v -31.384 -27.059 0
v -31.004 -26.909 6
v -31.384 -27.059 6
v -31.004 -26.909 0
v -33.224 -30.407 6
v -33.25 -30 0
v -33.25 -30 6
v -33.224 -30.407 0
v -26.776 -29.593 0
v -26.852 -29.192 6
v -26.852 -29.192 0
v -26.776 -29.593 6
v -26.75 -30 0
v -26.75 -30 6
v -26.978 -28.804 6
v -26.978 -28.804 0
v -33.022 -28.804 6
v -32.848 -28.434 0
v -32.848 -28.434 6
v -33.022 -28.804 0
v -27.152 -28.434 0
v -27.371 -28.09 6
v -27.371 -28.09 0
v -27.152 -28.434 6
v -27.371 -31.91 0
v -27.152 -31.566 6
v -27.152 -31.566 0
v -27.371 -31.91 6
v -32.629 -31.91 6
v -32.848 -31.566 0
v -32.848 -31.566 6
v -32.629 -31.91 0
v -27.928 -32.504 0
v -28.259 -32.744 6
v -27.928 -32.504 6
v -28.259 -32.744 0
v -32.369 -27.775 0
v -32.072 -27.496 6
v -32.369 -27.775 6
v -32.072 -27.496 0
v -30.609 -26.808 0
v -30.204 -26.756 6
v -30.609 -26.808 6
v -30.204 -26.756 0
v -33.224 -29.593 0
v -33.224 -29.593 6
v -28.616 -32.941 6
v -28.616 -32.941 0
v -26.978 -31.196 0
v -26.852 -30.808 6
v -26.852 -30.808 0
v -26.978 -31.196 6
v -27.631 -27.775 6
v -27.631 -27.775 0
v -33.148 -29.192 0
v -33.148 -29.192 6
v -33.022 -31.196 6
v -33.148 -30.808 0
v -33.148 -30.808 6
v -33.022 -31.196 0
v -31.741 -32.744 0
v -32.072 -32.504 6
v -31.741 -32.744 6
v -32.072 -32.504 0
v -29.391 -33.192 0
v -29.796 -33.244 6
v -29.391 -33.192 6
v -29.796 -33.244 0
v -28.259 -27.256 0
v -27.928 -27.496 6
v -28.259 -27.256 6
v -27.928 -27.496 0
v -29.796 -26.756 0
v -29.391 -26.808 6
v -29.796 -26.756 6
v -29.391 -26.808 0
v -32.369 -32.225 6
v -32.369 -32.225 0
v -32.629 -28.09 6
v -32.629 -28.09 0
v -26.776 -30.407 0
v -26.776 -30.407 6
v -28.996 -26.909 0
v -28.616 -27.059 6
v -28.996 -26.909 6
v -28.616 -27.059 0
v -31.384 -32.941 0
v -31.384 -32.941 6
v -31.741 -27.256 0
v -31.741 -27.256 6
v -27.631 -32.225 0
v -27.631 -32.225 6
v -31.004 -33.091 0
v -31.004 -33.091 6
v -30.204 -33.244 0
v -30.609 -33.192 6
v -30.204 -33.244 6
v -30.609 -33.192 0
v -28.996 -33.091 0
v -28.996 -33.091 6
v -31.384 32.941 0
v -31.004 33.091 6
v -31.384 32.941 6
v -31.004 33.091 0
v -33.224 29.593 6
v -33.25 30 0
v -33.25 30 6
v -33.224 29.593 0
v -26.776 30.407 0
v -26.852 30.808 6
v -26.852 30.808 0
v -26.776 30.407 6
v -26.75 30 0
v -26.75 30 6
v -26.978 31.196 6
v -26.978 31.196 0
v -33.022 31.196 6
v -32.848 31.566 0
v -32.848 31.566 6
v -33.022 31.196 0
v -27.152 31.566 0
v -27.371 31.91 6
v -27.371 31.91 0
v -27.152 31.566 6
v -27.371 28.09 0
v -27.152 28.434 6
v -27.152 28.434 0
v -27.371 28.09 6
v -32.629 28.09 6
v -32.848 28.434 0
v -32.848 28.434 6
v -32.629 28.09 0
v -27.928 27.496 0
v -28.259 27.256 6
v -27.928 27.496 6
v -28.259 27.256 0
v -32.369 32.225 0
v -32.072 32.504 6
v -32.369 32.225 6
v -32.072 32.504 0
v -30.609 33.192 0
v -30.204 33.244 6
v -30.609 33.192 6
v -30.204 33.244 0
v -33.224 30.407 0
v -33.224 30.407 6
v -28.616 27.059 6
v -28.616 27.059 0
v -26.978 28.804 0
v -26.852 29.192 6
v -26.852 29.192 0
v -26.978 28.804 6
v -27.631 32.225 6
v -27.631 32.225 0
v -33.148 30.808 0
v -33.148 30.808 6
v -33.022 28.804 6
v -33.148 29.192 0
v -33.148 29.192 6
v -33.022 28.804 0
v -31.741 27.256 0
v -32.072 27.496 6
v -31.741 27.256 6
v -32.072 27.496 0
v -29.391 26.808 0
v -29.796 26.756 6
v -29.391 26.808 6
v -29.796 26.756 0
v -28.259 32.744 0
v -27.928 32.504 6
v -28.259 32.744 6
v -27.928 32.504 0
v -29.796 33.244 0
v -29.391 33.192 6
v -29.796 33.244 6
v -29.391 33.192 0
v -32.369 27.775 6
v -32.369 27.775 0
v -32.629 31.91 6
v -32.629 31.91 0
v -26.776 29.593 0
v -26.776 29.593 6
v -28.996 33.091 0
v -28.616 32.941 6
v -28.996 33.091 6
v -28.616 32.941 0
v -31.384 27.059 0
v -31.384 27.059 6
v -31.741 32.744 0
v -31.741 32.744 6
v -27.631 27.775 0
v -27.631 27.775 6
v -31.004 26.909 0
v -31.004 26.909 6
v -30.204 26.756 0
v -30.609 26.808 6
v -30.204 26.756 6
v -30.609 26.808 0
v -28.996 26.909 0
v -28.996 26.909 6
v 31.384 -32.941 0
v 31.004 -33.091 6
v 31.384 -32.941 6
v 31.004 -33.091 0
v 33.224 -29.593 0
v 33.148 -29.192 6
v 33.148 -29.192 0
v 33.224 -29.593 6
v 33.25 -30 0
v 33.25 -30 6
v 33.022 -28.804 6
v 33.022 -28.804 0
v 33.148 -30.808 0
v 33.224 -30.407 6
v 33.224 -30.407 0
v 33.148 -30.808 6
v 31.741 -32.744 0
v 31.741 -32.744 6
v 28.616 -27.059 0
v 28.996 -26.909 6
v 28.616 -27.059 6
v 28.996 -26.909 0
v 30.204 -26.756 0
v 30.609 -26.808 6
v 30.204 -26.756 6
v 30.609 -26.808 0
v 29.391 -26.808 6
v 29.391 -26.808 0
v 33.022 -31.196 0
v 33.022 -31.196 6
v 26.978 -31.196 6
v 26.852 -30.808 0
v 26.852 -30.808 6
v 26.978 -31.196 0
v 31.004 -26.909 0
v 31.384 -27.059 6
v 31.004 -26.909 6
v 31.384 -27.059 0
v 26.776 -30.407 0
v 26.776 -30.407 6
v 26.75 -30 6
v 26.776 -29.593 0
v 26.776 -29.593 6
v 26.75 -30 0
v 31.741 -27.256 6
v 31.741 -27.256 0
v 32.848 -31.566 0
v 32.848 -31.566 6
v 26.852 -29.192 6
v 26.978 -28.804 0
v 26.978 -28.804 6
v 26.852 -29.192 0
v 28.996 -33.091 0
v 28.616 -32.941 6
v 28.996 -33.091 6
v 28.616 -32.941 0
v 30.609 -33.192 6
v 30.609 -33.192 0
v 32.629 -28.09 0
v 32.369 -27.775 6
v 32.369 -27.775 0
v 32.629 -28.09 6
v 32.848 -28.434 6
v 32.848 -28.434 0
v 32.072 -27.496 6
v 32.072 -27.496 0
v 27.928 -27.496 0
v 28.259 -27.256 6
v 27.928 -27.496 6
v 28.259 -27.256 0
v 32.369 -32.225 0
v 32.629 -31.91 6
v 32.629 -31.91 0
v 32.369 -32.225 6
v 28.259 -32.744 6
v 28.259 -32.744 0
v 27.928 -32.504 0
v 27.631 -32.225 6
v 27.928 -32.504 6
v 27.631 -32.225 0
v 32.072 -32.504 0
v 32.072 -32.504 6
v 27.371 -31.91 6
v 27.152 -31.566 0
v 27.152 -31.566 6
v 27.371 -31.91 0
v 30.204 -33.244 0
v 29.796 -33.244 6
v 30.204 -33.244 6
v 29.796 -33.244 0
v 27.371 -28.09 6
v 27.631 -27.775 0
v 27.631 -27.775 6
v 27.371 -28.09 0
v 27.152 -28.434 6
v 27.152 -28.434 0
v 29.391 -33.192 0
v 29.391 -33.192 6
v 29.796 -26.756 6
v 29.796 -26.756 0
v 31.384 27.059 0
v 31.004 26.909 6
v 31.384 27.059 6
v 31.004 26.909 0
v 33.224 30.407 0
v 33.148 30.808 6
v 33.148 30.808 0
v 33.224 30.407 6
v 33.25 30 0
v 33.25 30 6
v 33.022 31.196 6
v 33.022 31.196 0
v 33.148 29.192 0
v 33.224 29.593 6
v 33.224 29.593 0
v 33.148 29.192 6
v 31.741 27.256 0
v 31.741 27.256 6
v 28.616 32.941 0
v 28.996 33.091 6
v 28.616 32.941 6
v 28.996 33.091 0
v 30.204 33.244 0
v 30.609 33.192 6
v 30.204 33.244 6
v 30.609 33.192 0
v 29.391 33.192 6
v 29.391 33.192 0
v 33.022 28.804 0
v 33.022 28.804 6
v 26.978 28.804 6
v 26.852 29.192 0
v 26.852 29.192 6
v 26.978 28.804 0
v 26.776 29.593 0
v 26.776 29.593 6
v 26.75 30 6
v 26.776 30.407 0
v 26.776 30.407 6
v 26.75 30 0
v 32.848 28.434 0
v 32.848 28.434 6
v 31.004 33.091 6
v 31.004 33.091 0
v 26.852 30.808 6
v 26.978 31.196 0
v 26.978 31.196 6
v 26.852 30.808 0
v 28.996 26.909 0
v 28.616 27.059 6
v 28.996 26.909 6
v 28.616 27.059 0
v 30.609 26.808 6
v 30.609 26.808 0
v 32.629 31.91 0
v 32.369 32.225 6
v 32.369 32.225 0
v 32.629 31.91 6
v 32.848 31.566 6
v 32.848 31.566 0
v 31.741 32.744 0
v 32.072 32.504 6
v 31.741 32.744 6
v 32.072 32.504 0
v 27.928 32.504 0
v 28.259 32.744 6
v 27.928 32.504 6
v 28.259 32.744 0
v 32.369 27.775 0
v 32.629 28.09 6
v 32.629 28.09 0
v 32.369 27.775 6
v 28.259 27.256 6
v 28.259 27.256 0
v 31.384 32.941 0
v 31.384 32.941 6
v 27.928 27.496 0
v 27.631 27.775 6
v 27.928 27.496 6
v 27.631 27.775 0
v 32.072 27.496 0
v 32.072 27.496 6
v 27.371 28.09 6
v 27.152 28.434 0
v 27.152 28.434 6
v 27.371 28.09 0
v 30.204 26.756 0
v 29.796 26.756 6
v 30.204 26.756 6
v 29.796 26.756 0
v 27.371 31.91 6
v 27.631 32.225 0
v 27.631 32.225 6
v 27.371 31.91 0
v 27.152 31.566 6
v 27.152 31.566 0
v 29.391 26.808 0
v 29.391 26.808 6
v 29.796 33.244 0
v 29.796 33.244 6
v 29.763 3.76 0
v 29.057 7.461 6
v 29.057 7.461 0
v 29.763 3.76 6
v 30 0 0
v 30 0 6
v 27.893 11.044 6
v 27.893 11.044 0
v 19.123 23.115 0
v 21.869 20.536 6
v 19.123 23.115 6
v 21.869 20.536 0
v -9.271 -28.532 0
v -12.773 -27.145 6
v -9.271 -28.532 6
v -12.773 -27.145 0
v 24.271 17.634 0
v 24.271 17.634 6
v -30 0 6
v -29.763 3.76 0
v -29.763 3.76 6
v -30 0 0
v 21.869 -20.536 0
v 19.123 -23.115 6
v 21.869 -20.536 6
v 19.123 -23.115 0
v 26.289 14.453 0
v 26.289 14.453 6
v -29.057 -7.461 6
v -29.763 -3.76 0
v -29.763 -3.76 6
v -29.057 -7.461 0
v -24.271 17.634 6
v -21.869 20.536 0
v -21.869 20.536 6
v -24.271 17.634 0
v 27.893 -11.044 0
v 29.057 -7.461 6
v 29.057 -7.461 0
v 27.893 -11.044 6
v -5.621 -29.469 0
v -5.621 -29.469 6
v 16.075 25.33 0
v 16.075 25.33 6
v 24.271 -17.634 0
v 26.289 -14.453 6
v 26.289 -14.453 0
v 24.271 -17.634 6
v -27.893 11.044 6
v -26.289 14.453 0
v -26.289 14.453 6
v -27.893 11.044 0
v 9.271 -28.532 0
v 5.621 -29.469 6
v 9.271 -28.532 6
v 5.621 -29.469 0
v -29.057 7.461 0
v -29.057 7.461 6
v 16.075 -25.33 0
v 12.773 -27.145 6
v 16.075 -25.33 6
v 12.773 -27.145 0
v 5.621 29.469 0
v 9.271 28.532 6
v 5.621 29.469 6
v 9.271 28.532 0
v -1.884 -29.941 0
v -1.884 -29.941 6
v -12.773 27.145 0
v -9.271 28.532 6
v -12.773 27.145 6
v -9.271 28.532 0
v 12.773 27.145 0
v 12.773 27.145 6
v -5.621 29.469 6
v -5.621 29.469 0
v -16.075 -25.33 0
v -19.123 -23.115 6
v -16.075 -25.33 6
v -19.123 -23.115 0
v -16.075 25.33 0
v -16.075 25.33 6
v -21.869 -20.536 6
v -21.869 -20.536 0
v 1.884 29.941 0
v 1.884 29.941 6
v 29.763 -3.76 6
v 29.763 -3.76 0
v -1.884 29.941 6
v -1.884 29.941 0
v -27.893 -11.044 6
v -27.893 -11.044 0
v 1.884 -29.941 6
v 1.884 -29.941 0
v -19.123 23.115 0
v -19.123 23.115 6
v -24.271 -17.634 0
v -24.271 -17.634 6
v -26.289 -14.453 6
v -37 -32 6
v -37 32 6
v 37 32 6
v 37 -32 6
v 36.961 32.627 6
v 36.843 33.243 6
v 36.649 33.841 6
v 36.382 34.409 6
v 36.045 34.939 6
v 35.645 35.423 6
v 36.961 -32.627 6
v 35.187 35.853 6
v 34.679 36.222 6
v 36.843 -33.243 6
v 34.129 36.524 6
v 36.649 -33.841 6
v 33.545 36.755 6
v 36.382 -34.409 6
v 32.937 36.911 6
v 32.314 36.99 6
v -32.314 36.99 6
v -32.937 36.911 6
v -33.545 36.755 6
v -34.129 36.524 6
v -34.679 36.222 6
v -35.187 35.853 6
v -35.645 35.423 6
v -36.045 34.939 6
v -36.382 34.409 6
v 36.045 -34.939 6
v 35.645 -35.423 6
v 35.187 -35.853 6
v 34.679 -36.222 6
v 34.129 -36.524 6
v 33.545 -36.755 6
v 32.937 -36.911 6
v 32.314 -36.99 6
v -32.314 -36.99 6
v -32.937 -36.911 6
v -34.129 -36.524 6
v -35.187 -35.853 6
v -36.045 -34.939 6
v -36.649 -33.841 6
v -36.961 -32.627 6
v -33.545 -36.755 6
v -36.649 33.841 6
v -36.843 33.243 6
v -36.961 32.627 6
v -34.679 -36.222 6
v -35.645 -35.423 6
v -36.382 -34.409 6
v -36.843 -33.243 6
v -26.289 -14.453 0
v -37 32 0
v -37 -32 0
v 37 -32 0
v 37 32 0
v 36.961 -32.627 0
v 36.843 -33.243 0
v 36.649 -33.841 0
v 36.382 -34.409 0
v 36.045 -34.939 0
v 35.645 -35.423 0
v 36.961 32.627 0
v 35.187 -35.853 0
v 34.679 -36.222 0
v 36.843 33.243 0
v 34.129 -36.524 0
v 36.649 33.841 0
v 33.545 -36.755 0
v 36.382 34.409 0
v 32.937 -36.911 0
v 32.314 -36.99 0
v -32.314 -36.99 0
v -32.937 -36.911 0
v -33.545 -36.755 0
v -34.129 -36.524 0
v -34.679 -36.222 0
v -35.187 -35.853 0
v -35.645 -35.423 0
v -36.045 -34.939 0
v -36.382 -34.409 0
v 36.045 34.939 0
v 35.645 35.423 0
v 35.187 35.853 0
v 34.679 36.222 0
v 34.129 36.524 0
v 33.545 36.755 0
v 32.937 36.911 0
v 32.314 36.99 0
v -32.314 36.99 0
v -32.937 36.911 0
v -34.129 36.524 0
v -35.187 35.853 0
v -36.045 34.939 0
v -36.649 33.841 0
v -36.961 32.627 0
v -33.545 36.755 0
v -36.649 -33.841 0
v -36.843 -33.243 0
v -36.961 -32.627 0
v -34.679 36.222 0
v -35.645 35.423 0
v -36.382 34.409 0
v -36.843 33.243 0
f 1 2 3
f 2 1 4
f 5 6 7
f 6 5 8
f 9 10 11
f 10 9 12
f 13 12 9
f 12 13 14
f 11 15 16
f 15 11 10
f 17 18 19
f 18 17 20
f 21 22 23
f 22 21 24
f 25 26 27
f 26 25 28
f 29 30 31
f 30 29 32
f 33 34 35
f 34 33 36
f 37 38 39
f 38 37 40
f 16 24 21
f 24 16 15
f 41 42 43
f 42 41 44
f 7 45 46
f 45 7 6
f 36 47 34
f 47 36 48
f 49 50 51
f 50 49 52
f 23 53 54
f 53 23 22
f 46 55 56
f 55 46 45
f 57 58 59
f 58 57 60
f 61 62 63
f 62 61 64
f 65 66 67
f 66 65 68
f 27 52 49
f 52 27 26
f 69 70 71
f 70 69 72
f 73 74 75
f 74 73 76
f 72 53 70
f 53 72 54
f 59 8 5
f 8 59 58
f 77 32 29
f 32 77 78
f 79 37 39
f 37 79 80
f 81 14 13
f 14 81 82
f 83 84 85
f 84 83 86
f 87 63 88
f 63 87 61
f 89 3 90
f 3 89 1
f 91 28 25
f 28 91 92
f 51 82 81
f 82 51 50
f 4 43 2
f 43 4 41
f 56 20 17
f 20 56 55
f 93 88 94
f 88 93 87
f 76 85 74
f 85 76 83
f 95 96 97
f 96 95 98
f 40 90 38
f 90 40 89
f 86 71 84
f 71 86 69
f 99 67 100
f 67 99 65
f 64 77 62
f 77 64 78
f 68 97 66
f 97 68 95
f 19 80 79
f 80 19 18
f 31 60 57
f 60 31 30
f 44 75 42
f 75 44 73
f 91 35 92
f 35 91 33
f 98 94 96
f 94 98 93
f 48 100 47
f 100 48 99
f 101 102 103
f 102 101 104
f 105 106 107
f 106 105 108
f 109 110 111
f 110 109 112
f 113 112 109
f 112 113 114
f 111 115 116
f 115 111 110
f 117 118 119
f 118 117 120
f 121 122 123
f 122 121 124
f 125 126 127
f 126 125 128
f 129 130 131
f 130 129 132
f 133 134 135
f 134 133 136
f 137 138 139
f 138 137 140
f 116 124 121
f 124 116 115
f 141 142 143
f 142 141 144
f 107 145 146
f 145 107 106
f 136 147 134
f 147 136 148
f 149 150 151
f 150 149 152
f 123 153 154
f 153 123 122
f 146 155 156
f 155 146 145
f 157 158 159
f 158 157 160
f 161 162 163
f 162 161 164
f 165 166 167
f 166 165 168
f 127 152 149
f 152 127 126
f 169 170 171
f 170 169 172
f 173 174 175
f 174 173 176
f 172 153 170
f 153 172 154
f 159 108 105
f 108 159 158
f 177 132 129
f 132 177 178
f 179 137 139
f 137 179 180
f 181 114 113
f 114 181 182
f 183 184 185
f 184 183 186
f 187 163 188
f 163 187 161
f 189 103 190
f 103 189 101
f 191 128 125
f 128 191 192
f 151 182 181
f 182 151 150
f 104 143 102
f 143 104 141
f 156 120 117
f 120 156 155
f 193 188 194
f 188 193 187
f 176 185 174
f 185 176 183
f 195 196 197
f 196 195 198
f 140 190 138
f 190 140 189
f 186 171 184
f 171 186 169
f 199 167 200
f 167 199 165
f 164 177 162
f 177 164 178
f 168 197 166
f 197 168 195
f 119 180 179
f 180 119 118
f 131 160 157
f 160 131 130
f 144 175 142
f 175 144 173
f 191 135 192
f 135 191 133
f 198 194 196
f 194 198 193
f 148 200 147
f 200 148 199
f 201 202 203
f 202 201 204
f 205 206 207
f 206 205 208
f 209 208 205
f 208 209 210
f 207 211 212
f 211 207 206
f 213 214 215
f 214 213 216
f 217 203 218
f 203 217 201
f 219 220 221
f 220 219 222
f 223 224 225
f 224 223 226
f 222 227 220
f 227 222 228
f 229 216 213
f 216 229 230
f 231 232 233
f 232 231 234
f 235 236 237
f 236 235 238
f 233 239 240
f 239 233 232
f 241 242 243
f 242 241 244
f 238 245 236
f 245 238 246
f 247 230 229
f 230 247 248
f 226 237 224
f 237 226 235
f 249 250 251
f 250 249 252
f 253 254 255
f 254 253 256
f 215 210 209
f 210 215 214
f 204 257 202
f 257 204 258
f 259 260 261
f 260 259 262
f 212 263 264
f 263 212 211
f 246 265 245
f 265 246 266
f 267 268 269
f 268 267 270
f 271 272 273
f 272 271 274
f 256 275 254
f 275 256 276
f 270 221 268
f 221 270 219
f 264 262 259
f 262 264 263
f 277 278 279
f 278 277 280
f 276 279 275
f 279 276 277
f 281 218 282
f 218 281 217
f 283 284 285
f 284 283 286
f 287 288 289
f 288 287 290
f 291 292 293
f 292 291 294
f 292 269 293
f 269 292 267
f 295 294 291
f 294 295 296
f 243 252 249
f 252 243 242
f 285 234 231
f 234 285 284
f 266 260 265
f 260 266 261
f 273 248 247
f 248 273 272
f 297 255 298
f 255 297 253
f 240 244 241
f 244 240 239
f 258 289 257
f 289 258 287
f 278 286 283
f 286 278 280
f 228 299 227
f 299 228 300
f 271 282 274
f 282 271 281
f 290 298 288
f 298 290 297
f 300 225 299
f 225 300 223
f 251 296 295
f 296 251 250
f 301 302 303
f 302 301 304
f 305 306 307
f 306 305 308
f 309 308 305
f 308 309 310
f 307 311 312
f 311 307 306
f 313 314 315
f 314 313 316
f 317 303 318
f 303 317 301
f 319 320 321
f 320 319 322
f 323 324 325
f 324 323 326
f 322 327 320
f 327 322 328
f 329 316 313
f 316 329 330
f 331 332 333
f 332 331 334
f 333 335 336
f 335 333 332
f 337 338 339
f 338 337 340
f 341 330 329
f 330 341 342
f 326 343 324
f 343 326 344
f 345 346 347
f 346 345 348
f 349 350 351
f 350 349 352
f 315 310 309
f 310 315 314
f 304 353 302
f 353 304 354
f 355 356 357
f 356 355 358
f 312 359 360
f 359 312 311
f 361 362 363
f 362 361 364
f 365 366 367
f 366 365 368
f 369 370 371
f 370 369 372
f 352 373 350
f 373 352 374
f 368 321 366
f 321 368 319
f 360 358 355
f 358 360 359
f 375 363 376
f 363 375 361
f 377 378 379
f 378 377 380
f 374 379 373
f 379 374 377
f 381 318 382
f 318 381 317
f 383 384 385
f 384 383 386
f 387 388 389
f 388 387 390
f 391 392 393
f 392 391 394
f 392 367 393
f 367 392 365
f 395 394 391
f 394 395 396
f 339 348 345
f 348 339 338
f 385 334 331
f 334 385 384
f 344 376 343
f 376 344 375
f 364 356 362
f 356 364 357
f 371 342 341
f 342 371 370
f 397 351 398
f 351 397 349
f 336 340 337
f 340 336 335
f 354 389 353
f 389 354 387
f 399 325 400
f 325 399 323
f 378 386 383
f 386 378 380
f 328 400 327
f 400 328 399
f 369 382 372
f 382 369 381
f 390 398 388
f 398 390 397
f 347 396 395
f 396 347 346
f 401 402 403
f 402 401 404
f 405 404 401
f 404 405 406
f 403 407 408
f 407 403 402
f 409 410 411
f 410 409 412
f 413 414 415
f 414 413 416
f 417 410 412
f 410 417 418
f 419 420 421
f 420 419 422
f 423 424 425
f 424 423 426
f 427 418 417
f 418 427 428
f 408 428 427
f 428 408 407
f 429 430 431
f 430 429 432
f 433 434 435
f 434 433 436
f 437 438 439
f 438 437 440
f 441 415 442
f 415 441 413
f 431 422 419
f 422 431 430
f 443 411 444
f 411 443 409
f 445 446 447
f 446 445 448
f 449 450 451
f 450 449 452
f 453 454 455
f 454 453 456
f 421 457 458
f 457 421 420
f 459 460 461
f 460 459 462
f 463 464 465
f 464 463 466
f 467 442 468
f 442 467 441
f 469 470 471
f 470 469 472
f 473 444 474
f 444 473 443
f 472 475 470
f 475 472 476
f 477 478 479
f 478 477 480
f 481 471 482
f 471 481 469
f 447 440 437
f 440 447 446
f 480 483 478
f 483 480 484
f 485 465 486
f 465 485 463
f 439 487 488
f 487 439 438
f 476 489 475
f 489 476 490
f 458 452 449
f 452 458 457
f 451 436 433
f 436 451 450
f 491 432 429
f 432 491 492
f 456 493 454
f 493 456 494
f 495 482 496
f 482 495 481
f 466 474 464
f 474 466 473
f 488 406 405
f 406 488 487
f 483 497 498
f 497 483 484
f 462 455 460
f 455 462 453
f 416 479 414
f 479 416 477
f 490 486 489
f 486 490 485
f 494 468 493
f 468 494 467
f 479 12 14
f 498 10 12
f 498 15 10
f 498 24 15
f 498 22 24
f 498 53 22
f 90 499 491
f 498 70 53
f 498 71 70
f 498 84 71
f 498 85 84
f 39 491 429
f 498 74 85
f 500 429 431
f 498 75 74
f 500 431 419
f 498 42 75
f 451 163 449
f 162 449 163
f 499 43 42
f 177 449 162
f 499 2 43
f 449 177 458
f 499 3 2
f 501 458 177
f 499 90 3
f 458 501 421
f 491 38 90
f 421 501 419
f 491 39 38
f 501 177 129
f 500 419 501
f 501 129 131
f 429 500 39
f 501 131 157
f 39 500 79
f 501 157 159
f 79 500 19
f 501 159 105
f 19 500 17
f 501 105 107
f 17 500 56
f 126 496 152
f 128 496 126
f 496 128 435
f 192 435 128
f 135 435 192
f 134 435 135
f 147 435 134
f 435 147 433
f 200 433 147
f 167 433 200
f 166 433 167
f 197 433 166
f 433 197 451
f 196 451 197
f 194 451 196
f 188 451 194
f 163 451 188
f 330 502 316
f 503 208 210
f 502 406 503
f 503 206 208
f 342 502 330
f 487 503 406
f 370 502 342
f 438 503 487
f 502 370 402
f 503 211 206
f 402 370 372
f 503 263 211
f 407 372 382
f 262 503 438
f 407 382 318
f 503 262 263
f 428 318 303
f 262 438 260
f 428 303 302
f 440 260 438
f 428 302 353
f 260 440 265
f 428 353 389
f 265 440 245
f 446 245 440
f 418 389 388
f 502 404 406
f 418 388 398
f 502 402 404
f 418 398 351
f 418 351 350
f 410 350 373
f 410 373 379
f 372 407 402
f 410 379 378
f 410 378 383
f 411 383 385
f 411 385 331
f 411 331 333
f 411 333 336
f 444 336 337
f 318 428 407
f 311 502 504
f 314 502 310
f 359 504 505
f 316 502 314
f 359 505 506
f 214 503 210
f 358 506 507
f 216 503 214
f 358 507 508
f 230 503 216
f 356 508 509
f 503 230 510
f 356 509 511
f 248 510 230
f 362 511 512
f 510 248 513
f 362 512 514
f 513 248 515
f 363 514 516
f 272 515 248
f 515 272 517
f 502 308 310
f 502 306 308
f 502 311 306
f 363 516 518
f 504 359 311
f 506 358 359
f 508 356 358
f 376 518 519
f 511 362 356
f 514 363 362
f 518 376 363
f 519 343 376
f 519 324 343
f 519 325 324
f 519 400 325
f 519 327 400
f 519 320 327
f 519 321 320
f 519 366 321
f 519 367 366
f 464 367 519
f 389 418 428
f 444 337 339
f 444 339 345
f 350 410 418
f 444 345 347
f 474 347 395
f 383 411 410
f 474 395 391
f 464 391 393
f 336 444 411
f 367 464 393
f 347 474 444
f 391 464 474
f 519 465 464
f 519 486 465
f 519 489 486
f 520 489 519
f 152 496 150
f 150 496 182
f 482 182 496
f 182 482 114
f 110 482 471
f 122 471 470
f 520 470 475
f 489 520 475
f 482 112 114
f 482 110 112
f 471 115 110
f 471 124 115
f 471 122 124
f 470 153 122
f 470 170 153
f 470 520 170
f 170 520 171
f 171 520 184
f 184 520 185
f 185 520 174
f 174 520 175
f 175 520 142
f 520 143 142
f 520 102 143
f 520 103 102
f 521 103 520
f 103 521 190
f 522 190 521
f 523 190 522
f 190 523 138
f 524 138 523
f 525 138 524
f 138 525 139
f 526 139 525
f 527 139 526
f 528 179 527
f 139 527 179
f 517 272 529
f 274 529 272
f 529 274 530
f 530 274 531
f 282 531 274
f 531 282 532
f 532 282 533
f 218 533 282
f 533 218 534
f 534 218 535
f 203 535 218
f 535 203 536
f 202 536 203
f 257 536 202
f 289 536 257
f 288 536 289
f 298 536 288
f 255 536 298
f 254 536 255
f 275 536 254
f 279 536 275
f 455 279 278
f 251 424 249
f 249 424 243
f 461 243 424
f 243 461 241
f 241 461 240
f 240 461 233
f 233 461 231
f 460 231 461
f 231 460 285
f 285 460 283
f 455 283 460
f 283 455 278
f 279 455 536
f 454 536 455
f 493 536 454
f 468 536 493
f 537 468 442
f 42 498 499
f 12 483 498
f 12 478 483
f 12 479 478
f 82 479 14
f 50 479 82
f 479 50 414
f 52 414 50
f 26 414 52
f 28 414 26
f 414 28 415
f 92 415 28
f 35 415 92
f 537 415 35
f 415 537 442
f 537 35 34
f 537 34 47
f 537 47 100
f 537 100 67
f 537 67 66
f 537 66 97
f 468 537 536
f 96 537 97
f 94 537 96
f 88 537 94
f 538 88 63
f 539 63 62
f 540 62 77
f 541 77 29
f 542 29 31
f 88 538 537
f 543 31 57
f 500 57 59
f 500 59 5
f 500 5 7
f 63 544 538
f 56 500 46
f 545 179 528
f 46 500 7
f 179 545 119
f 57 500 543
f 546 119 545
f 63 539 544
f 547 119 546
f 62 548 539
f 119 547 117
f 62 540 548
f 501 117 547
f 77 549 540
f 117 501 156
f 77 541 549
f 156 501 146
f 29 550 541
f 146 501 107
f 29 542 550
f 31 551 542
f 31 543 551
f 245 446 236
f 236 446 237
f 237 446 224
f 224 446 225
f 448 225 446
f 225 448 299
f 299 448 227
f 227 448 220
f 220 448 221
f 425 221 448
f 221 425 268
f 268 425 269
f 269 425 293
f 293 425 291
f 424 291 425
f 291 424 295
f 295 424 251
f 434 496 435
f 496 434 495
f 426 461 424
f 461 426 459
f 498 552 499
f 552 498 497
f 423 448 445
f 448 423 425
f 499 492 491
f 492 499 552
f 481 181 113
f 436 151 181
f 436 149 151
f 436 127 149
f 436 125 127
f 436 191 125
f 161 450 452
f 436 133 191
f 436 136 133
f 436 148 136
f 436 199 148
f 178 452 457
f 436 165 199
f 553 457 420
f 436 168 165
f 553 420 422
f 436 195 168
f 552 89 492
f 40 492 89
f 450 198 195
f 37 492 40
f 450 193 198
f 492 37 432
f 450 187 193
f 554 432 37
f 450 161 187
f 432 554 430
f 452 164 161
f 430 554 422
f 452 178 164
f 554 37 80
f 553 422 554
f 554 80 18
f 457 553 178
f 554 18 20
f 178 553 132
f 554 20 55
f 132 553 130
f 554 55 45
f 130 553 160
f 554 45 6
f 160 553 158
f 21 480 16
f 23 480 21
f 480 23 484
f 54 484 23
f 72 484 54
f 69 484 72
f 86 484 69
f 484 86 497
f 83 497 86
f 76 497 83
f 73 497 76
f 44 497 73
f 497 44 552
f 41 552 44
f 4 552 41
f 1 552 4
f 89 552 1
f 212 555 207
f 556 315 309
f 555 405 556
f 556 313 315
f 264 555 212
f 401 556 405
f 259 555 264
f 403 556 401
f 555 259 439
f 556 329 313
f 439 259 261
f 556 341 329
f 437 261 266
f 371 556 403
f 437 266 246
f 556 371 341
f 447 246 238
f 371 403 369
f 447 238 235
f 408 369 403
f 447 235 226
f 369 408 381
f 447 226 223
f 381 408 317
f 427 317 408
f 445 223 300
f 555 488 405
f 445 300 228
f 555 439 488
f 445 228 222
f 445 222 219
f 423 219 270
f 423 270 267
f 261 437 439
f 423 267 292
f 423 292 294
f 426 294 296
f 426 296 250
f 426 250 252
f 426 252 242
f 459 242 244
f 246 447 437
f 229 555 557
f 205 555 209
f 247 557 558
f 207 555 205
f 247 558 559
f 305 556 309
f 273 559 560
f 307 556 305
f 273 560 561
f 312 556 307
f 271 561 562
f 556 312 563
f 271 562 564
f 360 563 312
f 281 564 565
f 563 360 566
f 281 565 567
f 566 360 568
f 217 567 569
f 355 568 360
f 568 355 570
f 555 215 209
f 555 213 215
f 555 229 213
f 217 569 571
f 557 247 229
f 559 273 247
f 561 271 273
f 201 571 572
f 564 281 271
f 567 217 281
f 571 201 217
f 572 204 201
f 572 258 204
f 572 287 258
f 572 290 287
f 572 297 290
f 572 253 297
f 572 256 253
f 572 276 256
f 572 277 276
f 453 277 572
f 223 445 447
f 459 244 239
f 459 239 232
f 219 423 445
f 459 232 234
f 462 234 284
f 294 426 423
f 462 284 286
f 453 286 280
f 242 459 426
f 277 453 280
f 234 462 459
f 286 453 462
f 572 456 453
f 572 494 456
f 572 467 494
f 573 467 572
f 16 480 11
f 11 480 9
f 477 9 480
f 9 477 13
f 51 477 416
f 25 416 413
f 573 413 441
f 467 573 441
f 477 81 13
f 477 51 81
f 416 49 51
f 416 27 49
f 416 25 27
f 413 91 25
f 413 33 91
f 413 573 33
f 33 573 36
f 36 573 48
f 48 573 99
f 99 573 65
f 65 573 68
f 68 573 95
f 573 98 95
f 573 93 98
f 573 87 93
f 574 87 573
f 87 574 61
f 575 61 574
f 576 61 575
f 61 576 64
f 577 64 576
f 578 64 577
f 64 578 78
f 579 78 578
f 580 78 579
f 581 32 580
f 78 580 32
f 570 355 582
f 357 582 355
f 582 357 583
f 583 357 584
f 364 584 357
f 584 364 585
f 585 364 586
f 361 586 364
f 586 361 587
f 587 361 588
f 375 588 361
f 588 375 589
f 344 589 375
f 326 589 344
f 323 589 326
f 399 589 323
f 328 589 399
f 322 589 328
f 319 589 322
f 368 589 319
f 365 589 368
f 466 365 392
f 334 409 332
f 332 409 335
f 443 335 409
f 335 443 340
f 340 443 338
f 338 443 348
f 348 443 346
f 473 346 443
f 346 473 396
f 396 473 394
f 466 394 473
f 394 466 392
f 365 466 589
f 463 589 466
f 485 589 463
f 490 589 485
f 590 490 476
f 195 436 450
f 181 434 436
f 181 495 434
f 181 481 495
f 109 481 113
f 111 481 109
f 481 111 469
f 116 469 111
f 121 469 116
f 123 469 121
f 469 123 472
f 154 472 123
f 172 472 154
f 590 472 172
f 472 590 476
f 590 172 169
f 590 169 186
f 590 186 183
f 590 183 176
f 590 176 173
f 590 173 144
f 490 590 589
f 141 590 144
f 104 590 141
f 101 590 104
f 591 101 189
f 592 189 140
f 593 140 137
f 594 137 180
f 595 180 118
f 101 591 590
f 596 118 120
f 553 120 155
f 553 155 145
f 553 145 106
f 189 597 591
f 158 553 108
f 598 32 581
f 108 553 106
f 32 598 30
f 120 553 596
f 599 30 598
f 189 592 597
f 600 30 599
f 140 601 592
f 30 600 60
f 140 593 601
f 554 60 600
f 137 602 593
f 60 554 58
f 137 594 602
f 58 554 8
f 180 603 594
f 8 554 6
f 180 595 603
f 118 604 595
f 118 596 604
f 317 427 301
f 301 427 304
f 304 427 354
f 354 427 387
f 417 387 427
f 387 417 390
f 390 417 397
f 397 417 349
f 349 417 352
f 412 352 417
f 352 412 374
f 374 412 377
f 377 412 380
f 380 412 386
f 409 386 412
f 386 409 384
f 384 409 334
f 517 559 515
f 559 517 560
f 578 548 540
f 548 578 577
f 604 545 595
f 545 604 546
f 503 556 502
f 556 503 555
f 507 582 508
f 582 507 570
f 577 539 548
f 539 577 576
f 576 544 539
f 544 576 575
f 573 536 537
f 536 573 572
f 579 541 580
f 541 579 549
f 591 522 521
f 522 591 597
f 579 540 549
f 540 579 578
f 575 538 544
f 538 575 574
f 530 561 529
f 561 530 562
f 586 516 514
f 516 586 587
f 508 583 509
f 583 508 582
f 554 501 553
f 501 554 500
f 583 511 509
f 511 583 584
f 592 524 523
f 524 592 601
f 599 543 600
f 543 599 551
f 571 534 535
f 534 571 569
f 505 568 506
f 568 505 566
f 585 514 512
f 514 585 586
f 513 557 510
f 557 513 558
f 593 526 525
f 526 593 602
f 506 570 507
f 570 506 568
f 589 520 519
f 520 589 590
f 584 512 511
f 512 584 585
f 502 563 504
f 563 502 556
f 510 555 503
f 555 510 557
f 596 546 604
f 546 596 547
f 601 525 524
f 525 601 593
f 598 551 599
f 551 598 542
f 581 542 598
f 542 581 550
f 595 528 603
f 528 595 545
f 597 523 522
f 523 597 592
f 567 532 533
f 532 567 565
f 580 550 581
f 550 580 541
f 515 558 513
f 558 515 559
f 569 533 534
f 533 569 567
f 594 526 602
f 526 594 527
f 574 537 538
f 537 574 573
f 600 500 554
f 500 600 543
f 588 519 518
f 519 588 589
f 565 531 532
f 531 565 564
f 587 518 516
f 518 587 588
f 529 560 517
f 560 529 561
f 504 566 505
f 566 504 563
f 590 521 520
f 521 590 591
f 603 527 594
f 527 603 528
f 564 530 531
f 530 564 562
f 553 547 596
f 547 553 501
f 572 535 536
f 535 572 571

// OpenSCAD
$fn = 50;

difference() {
	union() {
		hull() {
			translate(v = [-32.0, 32.0, 0]) {
				cylinder(h = 6, r = 5);
			}
			translate(v = [32.0, 32.0, 0]) {
				cylinder(h = 6, r = 5);
			}
			translate(v = [-32.0, -32.0, 0]) {
				cylinder(h = 6, r = 5);
			}
			translate(v = [32.0, -32.0, 0]) {
				cylinder(h = 6, r = 5);
			}
		}
	}
	union() {
		translate(v = [-30.0, -30.0, -100.0]) {
			cylinder(h = 200, r = 3.25);
		}
		translate(v = [-30.0, 30.0, -100.0]) {
			cylinder(h = 200, r = 3.25);
		}
		translate(v = [30.0, -30.0, -100.0]) {
			cylinder(h = 200, r = 3.25);
		}
		translate(v = [30.0, 30.0, -100.0]) {
			cylinder(h = 200, r = 3.25);
		}
		translate(v = [-30.0, -30.0, -100.0]) {
			cylinder(h = 200, r = 1.8);
		}
		translate(v = [-30.0, 30.0, -100.0]) {
			cylinder(h = 200, r = 1.8);
		}
		translate(v = [30.0, -30.0, -100.0]) {
			cylinder(h = 200, r = 1.8);
		}
		translate(v = [30.0, 30.0, -100.0]) {
			cylinder(h = 200, r = 1.8);
		}
		cylinder(h = 6, r = 30.0);
	}
}
